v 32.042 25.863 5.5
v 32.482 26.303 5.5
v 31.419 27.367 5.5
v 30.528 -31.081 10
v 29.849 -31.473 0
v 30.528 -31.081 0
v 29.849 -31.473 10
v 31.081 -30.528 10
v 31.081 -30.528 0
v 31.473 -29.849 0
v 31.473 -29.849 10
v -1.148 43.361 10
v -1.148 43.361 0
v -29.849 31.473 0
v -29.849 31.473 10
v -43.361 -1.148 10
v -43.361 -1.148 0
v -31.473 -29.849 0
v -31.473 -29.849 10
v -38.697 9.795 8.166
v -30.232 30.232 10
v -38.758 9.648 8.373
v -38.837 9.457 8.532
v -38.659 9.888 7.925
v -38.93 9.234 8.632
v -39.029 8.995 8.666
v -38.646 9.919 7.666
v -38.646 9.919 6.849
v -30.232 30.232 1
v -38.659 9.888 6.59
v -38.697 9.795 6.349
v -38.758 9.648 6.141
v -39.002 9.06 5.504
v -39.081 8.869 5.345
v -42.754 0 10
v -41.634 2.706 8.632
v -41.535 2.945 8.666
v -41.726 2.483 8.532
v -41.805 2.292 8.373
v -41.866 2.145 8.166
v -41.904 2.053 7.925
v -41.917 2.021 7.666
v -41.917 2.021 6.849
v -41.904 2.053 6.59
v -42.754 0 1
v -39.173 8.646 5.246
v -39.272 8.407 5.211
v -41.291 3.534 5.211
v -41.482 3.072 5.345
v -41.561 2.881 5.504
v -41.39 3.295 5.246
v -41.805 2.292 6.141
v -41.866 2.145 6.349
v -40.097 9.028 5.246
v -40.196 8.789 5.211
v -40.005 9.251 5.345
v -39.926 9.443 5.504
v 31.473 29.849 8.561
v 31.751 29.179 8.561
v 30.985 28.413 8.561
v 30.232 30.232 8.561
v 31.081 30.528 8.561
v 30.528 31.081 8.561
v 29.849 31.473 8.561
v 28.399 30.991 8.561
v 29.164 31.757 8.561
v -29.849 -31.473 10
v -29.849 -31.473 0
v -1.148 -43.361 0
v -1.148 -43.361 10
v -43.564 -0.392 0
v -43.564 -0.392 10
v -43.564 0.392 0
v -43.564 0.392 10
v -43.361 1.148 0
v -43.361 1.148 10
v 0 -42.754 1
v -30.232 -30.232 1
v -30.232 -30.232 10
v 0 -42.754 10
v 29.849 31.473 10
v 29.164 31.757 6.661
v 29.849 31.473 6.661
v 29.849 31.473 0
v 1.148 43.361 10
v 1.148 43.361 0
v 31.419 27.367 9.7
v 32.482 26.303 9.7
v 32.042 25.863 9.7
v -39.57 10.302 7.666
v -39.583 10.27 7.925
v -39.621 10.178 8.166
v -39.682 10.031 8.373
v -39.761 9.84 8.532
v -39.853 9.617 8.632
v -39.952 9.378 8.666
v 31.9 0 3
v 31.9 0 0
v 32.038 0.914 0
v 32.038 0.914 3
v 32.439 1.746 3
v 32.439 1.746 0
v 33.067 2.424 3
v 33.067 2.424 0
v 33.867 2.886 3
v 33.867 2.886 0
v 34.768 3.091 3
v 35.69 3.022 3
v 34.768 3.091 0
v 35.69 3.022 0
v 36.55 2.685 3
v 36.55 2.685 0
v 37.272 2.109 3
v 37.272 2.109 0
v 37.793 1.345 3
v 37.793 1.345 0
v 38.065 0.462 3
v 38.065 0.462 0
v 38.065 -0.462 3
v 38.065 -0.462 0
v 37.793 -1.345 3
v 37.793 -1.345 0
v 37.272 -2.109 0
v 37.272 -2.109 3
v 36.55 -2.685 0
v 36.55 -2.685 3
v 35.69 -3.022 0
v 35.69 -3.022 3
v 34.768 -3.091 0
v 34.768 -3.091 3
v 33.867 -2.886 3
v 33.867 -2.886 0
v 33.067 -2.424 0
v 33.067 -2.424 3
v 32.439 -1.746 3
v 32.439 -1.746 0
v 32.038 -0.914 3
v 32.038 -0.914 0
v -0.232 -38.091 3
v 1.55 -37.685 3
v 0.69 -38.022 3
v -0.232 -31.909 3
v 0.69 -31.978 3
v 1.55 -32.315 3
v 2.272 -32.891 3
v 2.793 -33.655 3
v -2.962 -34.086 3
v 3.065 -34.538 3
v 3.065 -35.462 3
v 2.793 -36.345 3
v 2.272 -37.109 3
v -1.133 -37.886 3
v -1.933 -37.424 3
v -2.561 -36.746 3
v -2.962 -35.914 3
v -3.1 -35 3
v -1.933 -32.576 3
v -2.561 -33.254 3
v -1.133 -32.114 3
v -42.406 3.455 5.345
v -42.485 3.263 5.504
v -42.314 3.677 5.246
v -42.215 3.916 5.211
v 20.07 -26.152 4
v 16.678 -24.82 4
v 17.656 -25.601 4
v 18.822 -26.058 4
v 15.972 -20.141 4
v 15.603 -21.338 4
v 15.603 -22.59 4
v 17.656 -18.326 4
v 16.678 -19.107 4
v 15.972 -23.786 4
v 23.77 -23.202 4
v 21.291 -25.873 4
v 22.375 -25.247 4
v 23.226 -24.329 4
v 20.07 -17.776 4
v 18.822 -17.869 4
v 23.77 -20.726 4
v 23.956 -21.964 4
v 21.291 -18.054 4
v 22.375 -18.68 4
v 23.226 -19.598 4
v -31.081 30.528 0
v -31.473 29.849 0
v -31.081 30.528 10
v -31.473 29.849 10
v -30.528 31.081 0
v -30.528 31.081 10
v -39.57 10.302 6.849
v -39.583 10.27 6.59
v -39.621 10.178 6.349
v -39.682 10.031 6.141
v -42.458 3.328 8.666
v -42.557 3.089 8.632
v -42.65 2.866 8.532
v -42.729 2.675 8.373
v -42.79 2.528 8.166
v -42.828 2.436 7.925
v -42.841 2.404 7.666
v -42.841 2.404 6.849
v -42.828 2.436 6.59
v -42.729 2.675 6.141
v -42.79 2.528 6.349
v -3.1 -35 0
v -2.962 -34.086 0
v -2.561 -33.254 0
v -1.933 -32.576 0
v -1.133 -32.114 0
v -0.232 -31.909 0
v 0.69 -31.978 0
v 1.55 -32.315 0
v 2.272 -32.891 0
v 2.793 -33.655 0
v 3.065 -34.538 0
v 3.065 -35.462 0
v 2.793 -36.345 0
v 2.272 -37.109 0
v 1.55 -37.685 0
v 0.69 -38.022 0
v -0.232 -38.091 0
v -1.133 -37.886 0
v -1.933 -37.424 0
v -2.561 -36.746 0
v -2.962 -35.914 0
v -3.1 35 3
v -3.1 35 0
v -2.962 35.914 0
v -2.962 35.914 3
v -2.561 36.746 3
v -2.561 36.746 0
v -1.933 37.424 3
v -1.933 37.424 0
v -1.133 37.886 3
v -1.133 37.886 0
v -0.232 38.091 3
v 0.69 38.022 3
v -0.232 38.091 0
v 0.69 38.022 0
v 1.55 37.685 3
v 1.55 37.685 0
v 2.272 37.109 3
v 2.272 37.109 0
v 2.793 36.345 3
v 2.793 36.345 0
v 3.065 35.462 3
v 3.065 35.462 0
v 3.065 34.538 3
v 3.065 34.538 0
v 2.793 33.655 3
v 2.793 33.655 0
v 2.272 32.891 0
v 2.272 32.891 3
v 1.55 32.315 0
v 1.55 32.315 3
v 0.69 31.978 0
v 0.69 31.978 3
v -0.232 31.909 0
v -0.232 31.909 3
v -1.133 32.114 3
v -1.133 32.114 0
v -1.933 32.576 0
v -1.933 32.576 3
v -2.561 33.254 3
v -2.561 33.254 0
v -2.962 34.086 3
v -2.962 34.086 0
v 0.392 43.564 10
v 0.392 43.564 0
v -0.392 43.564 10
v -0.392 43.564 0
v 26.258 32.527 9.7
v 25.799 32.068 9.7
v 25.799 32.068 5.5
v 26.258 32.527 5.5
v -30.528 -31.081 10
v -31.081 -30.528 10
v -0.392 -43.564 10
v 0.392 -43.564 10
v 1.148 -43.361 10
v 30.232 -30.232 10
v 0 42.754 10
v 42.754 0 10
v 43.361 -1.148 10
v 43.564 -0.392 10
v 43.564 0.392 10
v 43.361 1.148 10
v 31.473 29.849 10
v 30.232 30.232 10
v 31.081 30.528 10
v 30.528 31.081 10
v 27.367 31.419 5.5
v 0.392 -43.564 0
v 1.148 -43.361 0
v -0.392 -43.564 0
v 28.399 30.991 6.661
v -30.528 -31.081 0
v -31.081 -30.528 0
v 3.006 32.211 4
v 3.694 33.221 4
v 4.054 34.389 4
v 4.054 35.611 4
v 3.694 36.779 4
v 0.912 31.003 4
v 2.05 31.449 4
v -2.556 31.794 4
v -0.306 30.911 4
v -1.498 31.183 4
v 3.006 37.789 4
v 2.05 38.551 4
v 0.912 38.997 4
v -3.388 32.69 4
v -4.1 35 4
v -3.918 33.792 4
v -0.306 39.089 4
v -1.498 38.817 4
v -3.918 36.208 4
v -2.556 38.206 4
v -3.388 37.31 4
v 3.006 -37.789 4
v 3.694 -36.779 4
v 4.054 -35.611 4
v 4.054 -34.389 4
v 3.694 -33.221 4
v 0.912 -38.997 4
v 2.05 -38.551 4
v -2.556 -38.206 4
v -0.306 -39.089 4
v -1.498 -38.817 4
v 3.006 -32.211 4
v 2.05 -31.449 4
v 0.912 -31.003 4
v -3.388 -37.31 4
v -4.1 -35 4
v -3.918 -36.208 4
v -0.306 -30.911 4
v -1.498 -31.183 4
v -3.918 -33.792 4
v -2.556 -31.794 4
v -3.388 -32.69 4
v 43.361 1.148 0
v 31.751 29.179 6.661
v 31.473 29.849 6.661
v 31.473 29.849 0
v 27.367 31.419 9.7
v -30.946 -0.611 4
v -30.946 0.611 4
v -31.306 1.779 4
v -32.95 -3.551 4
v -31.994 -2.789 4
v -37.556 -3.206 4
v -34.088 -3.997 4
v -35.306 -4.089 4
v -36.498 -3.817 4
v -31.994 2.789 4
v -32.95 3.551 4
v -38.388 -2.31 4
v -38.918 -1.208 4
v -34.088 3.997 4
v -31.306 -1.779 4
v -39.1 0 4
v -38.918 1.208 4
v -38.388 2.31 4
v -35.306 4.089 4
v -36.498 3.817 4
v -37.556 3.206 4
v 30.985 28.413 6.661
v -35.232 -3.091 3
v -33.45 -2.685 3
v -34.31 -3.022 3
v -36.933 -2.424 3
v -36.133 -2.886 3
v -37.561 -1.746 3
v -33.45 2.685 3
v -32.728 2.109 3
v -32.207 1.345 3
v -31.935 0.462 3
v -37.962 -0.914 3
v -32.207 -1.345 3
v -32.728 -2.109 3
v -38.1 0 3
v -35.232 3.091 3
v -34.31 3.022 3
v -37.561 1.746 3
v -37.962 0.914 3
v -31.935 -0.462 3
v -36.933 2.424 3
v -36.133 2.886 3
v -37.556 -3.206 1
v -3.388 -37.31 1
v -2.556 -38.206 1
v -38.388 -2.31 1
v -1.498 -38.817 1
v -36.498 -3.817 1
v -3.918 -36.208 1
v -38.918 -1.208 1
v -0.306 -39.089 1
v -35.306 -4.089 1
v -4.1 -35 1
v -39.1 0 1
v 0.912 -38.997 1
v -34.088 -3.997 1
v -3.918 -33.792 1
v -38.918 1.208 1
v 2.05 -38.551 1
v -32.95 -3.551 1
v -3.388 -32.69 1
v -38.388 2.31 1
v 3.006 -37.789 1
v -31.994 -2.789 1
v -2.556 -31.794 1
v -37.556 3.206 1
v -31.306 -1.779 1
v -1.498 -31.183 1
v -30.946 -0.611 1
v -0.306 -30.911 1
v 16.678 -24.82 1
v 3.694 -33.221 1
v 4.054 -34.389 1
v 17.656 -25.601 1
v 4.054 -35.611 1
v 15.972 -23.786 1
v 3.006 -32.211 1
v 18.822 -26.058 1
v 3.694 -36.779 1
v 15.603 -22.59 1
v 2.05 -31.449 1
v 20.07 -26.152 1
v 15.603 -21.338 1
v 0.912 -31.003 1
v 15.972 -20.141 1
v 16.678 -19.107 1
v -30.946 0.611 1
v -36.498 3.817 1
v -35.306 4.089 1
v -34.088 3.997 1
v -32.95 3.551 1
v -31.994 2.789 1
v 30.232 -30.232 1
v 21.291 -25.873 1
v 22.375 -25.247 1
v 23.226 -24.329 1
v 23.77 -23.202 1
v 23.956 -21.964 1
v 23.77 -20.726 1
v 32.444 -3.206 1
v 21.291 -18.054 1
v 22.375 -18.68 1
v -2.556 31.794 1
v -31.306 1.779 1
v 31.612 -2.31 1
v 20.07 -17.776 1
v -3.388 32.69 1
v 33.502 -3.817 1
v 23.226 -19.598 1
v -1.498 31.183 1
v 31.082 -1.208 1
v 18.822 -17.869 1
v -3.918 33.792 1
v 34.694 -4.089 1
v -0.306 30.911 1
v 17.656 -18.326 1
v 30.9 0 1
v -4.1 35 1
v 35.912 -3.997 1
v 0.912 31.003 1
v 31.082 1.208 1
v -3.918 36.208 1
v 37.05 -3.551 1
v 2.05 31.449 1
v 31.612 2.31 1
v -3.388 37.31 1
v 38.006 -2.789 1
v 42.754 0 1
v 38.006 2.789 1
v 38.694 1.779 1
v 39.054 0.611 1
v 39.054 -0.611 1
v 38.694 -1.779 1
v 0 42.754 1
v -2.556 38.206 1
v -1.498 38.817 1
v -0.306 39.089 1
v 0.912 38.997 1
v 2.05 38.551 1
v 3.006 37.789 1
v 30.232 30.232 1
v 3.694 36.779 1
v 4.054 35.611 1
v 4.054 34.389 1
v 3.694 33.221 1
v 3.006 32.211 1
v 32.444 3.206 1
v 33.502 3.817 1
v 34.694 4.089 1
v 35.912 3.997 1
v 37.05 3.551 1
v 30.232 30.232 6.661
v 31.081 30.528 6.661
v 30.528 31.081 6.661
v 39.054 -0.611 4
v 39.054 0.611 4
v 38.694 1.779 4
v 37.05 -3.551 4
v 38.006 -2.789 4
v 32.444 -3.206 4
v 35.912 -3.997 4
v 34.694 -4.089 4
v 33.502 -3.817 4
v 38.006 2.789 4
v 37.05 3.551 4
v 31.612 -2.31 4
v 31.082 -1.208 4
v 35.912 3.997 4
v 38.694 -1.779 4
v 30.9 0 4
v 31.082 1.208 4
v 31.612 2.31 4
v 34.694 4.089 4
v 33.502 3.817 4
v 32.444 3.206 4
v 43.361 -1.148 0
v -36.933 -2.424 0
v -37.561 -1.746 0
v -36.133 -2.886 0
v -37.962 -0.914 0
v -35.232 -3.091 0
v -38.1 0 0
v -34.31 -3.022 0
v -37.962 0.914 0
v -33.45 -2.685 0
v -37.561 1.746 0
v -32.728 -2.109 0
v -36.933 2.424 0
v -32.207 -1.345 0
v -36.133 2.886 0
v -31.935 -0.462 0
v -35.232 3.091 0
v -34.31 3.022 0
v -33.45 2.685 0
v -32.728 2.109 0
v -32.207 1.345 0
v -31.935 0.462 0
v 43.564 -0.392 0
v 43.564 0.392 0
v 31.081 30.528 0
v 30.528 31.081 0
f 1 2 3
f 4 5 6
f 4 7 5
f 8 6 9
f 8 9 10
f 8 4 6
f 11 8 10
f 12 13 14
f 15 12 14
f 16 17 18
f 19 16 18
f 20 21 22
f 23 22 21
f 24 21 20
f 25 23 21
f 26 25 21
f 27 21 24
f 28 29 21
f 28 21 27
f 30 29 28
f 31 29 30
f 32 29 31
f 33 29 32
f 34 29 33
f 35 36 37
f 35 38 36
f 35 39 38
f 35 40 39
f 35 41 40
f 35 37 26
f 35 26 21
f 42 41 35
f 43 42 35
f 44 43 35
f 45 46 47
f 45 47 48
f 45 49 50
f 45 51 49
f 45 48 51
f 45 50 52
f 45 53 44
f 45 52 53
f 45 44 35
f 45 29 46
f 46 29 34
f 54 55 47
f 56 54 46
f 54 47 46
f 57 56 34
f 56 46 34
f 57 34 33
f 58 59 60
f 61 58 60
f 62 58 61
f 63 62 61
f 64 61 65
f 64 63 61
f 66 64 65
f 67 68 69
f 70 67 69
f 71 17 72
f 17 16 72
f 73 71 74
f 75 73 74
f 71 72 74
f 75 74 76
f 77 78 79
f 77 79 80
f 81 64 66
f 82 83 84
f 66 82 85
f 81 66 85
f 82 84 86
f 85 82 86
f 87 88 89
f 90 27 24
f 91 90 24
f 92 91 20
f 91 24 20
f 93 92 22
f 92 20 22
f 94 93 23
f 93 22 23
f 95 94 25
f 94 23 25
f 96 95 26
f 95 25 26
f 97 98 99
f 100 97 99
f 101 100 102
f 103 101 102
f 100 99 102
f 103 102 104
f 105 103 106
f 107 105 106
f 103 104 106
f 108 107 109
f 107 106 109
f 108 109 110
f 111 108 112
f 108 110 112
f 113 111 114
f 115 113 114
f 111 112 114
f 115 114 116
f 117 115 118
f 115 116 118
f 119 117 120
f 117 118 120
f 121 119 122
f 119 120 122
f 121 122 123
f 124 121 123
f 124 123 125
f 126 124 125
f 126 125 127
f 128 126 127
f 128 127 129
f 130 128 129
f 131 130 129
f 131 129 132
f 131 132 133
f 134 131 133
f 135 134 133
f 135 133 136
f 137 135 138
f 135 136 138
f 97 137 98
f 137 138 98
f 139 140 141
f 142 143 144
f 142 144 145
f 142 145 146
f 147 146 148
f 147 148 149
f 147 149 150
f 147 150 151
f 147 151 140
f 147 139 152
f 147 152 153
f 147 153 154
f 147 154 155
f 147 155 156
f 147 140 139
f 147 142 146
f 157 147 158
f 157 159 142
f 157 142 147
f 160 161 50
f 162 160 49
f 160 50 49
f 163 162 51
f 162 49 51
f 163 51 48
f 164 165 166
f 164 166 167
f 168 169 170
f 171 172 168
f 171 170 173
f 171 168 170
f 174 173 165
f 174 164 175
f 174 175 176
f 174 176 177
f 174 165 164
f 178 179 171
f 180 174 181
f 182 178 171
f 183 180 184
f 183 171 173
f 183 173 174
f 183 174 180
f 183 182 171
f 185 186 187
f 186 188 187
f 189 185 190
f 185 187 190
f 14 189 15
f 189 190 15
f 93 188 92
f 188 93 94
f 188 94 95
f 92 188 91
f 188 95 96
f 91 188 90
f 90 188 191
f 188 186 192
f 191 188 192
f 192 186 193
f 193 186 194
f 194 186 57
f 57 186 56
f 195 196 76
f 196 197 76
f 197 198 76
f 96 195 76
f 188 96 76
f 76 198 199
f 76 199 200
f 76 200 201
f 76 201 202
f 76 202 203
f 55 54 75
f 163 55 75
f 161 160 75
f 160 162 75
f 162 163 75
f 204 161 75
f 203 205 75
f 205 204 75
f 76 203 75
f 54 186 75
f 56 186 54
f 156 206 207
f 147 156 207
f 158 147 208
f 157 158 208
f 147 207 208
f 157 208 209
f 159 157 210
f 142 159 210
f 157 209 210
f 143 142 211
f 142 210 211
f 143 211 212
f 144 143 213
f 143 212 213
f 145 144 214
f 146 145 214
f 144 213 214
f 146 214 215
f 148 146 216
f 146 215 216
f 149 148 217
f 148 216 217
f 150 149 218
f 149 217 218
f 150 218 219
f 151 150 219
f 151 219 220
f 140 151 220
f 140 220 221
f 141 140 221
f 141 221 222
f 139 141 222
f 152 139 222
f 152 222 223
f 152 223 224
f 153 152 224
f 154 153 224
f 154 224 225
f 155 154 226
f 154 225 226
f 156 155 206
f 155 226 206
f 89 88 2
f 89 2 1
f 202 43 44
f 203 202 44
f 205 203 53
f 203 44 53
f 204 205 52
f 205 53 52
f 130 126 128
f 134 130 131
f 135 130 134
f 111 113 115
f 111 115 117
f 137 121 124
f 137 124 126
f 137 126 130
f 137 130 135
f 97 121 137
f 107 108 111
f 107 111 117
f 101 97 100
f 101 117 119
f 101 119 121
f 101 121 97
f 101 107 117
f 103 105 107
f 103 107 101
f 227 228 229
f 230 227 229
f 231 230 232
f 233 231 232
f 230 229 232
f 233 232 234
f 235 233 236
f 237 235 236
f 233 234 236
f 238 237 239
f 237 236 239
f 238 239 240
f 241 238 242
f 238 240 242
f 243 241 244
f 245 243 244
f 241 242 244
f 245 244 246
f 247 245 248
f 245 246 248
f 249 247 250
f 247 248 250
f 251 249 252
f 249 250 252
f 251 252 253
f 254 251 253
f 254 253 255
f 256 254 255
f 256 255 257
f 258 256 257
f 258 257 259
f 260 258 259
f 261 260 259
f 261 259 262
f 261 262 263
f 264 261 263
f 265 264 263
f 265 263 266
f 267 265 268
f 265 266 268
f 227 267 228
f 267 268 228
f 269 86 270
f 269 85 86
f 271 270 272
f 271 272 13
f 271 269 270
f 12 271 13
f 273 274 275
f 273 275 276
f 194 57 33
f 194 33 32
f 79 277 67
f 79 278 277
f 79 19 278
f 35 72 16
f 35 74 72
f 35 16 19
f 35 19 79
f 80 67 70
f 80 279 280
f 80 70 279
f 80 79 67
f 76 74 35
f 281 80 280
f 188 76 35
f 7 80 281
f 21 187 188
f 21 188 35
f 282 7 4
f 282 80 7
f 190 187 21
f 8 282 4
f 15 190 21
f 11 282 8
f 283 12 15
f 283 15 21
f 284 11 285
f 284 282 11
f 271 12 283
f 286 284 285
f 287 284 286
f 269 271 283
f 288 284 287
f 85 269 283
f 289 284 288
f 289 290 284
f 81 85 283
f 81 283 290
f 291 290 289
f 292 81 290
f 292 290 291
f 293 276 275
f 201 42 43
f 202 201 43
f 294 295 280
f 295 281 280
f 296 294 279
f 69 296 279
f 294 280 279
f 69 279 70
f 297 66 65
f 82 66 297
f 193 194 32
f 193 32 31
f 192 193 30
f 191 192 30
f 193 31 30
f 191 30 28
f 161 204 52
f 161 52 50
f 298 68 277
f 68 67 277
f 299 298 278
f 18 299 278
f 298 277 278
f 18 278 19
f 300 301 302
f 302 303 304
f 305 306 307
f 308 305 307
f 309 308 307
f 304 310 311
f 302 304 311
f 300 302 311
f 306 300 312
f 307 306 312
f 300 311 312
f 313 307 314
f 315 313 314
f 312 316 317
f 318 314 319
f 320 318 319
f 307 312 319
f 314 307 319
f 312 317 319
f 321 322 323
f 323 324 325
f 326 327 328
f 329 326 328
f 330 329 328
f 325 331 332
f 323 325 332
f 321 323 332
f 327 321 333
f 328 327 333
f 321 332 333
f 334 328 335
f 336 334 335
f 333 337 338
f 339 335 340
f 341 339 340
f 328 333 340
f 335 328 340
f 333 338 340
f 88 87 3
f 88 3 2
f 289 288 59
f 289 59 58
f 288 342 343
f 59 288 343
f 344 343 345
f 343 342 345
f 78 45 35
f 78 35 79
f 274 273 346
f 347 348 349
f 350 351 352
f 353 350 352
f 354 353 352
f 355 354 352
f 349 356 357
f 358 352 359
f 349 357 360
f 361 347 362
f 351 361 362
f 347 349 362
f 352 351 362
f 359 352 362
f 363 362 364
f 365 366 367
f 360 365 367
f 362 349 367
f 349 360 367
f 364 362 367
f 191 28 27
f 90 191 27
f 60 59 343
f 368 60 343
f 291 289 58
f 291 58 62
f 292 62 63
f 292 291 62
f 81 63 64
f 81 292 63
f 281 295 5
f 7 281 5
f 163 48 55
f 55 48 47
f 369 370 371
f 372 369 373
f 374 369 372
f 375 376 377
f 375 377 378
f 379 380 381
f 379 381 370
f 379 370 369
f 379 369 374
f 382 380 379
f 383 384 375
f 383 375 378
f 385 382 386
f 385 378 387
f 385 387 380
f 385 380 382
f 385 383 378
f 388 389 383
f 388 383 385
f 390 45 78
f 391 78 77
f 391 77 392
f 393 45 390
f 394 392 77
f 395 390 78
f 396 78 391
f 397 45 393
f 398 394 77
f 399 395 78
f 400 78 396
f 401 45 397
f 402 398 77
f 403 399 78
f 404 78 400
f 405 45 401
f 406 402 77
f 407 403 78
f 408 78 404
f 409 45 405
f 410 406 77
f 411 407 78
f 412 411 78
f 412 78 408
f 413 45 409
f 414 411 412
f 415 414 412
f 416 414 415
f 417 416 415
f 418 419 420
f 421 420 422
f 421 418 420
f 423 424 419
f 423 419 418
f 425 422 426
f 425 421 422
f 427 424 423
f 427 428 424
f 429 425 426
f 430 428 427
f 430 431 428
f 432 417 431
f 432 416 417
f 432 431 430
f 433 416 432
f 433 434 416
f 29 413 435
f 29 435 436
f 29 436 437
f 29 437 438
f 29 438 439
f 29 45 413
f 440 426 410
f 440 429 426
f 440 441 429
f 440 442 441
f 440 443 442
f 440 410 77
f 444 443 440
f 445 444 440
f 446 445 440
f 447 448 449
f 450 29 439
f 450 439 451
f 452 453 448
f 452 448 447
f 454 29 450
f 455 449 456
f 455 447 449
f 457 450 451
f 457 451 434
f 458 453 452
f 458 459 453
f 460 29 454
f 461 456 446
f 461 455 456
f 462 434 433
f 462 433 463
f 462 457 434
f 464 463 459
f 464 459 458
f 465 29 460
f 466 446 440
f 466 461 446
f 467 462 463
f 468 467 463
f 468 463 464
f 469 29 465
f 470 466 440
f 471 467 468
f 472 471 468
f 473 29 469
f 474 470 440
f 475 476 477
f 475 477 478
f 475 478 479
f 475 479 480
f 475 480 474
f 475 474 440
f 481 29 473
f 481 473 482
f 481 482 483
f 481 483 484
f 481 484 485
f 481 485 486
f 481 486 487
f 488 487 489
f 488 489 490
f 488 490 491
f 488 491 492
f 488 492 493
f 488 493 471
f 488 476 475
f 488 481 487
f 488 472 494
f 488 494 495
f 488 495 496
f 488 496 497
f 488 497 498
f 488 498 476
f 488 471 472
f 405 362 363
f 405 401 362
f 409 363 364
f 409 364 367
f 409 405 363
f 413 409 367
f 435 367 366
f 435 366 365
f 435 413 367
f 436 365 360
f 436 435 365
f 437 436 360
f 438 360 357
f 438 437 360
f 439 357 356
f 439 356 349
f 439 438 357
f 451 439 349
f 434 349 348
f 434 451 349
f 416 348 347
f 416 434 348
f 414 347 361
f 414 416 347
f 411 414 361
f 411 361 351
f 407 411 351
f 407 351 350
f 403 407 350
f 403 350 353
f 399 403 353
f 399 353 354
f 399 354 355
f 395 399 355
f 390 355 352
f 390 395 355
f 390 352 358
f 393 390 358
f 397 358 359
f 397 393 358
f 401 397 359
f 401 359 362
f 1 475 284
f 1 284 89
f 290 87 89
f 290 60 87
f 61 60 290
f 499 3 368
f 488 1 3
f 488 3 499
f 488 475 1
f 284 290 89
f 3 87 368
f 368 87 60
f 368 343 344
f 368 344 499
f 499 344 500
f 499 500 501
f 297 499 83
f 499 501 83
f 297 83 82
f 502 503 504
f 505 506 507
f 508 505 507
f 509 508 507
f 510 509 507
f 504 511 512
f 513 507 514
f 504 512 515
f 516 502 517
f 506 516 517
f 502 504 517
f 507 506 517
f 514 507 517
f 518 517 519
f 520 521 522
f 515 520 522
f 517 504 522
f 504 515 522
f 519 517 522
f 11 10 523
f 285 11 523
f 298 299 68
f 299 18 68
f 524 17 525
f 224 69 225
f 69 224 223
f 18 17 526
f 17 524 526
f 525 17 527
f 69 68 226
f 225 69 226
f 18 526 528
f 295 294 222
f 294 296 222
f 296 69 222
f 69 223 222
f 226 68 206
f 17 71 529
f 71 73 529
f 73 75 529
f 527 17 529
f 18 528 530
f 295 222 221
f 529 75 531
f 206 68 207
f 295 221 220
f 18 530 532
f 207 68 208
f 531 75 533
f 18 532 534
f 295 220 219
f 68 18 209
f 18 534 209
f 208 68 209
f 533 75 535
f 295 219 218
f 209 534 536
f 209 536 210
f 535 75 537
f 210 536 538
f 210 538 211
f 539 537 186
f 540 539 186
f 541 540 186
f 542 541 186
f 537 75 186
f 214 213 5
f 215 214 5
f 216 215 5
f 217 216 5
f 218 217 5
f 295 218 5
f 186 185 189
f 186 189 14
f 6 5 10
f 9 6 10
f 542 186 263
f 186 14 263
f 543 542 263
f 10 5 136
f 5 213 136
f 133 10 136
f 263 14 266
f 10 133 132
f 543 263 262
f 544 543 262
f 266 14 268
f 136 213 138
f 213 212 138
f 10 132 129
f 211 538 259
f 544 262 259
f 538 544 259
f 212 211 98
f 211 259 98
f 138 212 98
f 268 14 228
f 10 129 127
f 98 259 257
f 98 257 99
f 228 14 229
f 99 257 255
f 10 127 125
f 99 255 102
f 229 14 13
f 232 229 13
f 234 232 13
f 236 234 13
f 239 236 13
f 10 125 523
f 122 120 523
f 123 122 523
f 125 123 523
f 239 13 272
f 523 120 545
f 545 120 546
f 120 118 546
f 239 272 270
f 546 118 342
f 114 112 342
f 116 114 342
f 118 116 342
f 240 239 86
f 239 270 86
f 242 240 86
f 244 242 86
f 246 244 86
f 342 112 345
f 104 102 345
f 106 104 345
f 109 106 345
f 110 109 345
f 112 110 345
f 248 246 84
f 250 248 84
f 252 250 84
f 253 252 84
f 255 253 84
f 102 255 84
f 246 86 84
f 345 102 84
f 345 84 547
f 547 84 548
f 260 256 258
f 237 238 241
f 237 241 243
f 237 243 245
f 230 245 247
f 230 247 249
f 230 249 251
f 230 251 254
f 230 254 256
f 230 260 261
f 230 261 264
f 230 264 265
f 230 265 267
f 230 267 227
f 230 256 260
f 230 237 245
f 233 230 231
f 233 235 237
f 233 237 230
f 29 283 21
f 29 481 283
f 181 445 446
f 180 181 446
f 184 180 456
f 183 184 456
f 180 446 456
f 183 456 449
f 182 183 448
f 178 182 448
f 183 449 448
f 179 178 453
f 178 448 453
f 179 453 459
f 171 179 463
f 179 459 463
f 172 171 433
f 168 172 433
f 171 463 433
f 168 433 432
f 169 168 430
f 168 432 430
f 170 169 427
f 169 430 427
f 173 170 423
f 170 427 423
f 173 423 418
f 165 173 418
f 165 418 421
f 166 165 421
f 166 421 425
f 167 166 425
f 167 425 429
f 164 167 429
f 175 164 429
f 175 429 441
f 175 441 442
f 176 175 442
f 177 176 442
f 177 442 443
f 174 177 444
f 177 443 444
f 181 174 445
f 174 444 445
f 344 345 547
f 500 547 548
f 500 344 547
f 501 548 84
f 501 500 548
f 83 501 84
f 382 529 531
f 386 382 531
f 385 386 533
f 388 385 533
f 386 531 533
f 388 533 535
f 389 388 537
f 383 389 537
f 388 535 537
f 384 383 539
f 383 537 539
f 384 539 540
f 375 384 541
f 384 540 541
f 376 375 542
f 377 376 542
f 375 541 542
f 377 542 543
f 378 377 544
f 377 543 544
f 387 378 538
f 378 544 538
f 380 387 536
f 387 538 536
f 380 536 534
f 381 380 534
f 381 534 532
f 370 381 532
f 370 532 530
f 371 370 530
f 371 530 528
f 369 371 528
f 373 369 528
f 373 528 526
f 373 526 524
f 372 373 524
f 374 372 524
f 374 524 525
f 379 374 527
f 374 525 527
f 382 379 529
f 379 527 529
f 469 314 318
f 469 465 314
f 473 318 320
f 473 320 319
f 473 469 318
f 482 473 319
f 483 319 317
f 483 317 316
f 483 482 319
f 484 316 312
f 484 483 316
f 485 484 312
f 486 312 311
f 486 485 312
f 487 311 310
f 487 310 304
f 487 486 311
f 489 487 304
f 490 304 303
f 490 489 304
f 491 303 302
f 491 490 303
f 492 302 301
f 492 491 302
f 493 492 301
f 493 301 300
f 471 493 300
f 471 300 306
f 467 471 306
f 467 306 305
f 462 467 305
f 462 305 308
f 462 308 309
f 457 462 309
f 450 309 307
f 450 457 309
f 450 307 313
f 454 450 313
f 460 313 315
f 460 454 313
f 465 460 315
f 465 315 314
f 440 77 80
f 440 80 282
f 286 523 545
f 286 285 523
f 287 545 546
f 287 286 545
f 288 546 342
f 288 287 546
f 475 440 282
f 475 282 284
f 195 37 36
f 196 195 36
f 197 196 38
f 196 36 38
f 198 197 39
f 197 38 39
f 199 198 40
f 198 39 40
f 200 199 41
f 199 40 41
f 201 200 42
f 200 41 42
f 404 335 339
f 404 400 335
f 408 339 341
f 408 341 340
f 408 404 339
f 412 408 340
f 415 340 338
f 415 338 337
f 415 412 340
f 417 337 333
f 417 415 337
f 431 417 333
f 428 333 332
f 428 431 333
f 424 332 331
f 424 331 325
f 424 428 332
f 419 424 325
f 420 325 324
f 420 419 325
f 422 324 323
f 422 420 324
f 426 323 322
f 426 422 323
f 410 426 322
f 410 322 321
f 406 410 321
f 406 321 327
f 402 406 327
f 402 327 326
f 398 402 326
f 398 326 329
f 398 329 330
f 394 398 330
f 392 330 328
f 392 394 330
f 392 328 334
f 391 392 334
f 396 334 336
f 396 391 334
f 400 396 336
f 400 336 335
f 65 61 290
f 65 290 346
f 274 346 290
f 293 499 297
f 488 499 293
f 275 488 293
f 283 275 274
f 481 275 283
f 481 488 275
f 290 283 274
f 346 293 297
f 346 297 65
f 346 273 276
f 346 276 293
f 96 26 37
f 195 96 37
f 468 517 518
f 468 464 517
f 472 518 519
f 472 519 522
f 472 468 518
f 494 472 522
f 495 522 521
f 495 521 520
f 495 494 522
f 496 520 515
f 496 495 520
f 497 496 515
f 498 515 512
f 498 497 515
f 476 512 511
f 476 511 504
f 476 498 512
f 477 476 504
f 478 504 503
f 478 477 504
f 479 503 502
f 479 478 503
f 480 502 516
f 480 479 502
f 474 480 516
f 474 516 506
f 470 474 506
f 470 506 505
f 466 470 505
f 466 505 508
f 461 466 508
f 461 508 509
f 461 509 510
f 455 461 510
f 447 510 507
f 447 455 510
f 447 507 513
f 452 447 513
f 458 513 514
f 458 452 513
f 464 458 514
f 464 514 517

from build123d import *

# Parameters (mm, degrees)
BOSS_EXTRU_1_DEPTH           = 10
ESQUISSE2_R                  = 3.1
ENL_V_MAT_EXTRU_1_DEPTH      = 3
COQUE2_T                     = -1
CONG_1_R                     = 3
ENL_V_MAT_EXTRU_2_DEPTH      = 10
ESQUISSE4_R                  = 4.199805961
BOSS_EXTRU_2_DEPTH           = 3
ESQUISSE5_W                  = 3.651716426
ESQUISSE5_H                  = 1.9
ENL_V_MAT_EXTRU_3_DEPTH      = 11
ENL_V_MAT_EXTRU_3_DEPTH_BACK = 11
ENL_V_START                  = -0.3
ENL_V_MAT_EXTRU_4_DEPTH      = 4.2


with BuildPart() as part:
    # Esquisse1 → Boss.-Extru.1 (new body)
    with BuildSketch(Plane.XY):
        Polygon((0, -43.836884112), (30.997358022, -30.997358022), (43.836884112, 0), (30.997358022, 30.997358022), (0, 43.836884112), (-30.997358022, 30.997358022), (-43.836884112, 0), (-30.997358022, -30.997358022), align=None)
    extrude(amount=BOSS_EXTRU_1_DEPTH)

    # Esquisse2 → Enl_v. mat.-Extru.1 (cut)
    with BuildSketch(Plane(origin=(0, 0, 0), x_dir=(-1, 0, 0), z_dir=(0, 0, -1))):
        with Locations((0, 35)):
            Circle(ESQUISSE2_R)
        with Locations((35, 0)):
            Circle(ESQUISSE2_R)
        with Locations((0, -35)):
            Circle(ESQUISSE2_R)
        with Locations((-35, 0)):
            Circle(ESQUISSE2_R)
    extrude(amount=-ENL_V_MAT_EXTRU_1_DEPTH, mode=Mode.SUBTRACT)

    # Coque2
    coque2_openings = [part.faces().sort_by_distance(p)[0] for p in [
        (0, 0, 10),
    ]]
    offset(amount=COQUE2_T, openings=coque2_openings, kind=Kind.INTERSECTION)

    # Cong_1
    cong_1_edges = [part.edges().sort_by_distance(p)[0] for p in [
        (30.997358022, -30.997358022, 5),
        (0, -43.836884112, 5),
        (-30.997358022, -30.997358022, 5),
        (-43.836884112, 0, 5),
        (-30.997358022, 30.997358022, 5),
        (0, 43.836884112, 5),
        (30.997358022, 30.997358022, 5),
        (43.836884112, 0, 5),
    ]]
    fillet(cong_1_edges, radius=CONG_1_R)

    # Esquisse3 → Enl_v. mat.-Extru.2 (cut)
    with BuildSketch(Plane(origin=(-36.493241534, 15.115995578, 0), x_dir=(0, 0, -1), z_dir=(0.923879533, -0.382683432, 0))):
        with BuildLine():
            Line((-7.666279935, -14.17353482), (-6.84853173, -14.17353482))
            ThreePointArc((-6.84853173, -14.17353482), (-6.465848297, -14.097414353), (-6.141424949, -13.880641601))
            Line((-6.141424949, -13.880641601), (-5.504373219, -13.243589871))
            ThreePointArc((-5.504373219, -13.243589871), (-5.287600467, -12.919166523), (-5.21148, -12.53648309))
            Line((-5.21148, -12.53648309), (-5.21148, -7.262190369))
            ThreePointArc((-5.21148, -7.262190369), (-5.287600467, -6.879506937), (-5.504373219, -6.555083588))
            Line((-5.504373219, -6.555083588), (-6.141424949, -5.918031858))
            ThreePointArc((-6.141424949, -5.918031858), (-6.465848297, -5.701259107), (-6.84853173, -5.625138639))
            Line((-6.84853173, -5.625138639), (-7.666279935, -5.625138639))
            ThreePointArc((-7.666279935, -5.625138639), (-8.373386716, -5.918031858), (-8.666279935, -6.625138639))
            Line((-8.666279935, -6.625138639), (-8.666279935, -13.17353482))
            ThreePointArc((-8.666279935, -13.17353482), (-8.373386716, -13.880641601), (-7.666279935, -14.17353482))
        make_face()
    extrude(amount=-ENL_V_MAT_EXTRU_2_DEPTH, mode=Mode.SUBTRACT)

    # Esquisse4 → Boss.-Extru.2 (add)
    with BuildSketch(Plane.XY.offset(1)):
        with Locations((19.756285748, -21.963635985)):
            Circle(ESQUISSE4_R)
    extrude(amount=BOSS_EXTRU_2_DEPTH)

    # Esquisse5 → Enl_v. mat.-Extru.3 (cut, two sides)
    with BuildSketch(Plane(origin=(30.661101875, 30.661101875, 0), x_dir=(-0.707106781, 0.707106781, 0), z_dir=(-0.707106781, -0.707106781, 0))) as enl_v_mat_extru_3_sk:
        with Locations((0.007298531, -7.61148)):
            Rectangle(ESQUISSE5_W, ESQUISSE5_H)
    extrude(amount=ENL_V_MAT_EXTRU_3_DEPTH, mode=Mode.SUBTRACT)
    extrude(enl_v_mat_extru_3_sk.sketch, amount=-ENL_V_MAT_EXTRU_3_DEPTH_BACK, mode=Mode.SUBTRACT)

    # Esquisse6 → Enl_v. mat.-Extru.4 (cut)
    with BuildSketch(Plane.XY.offset(10).offset(ENL_V_START)):
        Polygon((26.258054531, 32.527484923), (32.482135733, 26.303403722), (28.600771667, 22.422039656), (22.376690466, 28.646120858), align=None)
    extrude(amount=-ENL_V_MAT_EXTRU_4_DEPTH, mode=Mode.SUBTRACT)


solid = part.part
